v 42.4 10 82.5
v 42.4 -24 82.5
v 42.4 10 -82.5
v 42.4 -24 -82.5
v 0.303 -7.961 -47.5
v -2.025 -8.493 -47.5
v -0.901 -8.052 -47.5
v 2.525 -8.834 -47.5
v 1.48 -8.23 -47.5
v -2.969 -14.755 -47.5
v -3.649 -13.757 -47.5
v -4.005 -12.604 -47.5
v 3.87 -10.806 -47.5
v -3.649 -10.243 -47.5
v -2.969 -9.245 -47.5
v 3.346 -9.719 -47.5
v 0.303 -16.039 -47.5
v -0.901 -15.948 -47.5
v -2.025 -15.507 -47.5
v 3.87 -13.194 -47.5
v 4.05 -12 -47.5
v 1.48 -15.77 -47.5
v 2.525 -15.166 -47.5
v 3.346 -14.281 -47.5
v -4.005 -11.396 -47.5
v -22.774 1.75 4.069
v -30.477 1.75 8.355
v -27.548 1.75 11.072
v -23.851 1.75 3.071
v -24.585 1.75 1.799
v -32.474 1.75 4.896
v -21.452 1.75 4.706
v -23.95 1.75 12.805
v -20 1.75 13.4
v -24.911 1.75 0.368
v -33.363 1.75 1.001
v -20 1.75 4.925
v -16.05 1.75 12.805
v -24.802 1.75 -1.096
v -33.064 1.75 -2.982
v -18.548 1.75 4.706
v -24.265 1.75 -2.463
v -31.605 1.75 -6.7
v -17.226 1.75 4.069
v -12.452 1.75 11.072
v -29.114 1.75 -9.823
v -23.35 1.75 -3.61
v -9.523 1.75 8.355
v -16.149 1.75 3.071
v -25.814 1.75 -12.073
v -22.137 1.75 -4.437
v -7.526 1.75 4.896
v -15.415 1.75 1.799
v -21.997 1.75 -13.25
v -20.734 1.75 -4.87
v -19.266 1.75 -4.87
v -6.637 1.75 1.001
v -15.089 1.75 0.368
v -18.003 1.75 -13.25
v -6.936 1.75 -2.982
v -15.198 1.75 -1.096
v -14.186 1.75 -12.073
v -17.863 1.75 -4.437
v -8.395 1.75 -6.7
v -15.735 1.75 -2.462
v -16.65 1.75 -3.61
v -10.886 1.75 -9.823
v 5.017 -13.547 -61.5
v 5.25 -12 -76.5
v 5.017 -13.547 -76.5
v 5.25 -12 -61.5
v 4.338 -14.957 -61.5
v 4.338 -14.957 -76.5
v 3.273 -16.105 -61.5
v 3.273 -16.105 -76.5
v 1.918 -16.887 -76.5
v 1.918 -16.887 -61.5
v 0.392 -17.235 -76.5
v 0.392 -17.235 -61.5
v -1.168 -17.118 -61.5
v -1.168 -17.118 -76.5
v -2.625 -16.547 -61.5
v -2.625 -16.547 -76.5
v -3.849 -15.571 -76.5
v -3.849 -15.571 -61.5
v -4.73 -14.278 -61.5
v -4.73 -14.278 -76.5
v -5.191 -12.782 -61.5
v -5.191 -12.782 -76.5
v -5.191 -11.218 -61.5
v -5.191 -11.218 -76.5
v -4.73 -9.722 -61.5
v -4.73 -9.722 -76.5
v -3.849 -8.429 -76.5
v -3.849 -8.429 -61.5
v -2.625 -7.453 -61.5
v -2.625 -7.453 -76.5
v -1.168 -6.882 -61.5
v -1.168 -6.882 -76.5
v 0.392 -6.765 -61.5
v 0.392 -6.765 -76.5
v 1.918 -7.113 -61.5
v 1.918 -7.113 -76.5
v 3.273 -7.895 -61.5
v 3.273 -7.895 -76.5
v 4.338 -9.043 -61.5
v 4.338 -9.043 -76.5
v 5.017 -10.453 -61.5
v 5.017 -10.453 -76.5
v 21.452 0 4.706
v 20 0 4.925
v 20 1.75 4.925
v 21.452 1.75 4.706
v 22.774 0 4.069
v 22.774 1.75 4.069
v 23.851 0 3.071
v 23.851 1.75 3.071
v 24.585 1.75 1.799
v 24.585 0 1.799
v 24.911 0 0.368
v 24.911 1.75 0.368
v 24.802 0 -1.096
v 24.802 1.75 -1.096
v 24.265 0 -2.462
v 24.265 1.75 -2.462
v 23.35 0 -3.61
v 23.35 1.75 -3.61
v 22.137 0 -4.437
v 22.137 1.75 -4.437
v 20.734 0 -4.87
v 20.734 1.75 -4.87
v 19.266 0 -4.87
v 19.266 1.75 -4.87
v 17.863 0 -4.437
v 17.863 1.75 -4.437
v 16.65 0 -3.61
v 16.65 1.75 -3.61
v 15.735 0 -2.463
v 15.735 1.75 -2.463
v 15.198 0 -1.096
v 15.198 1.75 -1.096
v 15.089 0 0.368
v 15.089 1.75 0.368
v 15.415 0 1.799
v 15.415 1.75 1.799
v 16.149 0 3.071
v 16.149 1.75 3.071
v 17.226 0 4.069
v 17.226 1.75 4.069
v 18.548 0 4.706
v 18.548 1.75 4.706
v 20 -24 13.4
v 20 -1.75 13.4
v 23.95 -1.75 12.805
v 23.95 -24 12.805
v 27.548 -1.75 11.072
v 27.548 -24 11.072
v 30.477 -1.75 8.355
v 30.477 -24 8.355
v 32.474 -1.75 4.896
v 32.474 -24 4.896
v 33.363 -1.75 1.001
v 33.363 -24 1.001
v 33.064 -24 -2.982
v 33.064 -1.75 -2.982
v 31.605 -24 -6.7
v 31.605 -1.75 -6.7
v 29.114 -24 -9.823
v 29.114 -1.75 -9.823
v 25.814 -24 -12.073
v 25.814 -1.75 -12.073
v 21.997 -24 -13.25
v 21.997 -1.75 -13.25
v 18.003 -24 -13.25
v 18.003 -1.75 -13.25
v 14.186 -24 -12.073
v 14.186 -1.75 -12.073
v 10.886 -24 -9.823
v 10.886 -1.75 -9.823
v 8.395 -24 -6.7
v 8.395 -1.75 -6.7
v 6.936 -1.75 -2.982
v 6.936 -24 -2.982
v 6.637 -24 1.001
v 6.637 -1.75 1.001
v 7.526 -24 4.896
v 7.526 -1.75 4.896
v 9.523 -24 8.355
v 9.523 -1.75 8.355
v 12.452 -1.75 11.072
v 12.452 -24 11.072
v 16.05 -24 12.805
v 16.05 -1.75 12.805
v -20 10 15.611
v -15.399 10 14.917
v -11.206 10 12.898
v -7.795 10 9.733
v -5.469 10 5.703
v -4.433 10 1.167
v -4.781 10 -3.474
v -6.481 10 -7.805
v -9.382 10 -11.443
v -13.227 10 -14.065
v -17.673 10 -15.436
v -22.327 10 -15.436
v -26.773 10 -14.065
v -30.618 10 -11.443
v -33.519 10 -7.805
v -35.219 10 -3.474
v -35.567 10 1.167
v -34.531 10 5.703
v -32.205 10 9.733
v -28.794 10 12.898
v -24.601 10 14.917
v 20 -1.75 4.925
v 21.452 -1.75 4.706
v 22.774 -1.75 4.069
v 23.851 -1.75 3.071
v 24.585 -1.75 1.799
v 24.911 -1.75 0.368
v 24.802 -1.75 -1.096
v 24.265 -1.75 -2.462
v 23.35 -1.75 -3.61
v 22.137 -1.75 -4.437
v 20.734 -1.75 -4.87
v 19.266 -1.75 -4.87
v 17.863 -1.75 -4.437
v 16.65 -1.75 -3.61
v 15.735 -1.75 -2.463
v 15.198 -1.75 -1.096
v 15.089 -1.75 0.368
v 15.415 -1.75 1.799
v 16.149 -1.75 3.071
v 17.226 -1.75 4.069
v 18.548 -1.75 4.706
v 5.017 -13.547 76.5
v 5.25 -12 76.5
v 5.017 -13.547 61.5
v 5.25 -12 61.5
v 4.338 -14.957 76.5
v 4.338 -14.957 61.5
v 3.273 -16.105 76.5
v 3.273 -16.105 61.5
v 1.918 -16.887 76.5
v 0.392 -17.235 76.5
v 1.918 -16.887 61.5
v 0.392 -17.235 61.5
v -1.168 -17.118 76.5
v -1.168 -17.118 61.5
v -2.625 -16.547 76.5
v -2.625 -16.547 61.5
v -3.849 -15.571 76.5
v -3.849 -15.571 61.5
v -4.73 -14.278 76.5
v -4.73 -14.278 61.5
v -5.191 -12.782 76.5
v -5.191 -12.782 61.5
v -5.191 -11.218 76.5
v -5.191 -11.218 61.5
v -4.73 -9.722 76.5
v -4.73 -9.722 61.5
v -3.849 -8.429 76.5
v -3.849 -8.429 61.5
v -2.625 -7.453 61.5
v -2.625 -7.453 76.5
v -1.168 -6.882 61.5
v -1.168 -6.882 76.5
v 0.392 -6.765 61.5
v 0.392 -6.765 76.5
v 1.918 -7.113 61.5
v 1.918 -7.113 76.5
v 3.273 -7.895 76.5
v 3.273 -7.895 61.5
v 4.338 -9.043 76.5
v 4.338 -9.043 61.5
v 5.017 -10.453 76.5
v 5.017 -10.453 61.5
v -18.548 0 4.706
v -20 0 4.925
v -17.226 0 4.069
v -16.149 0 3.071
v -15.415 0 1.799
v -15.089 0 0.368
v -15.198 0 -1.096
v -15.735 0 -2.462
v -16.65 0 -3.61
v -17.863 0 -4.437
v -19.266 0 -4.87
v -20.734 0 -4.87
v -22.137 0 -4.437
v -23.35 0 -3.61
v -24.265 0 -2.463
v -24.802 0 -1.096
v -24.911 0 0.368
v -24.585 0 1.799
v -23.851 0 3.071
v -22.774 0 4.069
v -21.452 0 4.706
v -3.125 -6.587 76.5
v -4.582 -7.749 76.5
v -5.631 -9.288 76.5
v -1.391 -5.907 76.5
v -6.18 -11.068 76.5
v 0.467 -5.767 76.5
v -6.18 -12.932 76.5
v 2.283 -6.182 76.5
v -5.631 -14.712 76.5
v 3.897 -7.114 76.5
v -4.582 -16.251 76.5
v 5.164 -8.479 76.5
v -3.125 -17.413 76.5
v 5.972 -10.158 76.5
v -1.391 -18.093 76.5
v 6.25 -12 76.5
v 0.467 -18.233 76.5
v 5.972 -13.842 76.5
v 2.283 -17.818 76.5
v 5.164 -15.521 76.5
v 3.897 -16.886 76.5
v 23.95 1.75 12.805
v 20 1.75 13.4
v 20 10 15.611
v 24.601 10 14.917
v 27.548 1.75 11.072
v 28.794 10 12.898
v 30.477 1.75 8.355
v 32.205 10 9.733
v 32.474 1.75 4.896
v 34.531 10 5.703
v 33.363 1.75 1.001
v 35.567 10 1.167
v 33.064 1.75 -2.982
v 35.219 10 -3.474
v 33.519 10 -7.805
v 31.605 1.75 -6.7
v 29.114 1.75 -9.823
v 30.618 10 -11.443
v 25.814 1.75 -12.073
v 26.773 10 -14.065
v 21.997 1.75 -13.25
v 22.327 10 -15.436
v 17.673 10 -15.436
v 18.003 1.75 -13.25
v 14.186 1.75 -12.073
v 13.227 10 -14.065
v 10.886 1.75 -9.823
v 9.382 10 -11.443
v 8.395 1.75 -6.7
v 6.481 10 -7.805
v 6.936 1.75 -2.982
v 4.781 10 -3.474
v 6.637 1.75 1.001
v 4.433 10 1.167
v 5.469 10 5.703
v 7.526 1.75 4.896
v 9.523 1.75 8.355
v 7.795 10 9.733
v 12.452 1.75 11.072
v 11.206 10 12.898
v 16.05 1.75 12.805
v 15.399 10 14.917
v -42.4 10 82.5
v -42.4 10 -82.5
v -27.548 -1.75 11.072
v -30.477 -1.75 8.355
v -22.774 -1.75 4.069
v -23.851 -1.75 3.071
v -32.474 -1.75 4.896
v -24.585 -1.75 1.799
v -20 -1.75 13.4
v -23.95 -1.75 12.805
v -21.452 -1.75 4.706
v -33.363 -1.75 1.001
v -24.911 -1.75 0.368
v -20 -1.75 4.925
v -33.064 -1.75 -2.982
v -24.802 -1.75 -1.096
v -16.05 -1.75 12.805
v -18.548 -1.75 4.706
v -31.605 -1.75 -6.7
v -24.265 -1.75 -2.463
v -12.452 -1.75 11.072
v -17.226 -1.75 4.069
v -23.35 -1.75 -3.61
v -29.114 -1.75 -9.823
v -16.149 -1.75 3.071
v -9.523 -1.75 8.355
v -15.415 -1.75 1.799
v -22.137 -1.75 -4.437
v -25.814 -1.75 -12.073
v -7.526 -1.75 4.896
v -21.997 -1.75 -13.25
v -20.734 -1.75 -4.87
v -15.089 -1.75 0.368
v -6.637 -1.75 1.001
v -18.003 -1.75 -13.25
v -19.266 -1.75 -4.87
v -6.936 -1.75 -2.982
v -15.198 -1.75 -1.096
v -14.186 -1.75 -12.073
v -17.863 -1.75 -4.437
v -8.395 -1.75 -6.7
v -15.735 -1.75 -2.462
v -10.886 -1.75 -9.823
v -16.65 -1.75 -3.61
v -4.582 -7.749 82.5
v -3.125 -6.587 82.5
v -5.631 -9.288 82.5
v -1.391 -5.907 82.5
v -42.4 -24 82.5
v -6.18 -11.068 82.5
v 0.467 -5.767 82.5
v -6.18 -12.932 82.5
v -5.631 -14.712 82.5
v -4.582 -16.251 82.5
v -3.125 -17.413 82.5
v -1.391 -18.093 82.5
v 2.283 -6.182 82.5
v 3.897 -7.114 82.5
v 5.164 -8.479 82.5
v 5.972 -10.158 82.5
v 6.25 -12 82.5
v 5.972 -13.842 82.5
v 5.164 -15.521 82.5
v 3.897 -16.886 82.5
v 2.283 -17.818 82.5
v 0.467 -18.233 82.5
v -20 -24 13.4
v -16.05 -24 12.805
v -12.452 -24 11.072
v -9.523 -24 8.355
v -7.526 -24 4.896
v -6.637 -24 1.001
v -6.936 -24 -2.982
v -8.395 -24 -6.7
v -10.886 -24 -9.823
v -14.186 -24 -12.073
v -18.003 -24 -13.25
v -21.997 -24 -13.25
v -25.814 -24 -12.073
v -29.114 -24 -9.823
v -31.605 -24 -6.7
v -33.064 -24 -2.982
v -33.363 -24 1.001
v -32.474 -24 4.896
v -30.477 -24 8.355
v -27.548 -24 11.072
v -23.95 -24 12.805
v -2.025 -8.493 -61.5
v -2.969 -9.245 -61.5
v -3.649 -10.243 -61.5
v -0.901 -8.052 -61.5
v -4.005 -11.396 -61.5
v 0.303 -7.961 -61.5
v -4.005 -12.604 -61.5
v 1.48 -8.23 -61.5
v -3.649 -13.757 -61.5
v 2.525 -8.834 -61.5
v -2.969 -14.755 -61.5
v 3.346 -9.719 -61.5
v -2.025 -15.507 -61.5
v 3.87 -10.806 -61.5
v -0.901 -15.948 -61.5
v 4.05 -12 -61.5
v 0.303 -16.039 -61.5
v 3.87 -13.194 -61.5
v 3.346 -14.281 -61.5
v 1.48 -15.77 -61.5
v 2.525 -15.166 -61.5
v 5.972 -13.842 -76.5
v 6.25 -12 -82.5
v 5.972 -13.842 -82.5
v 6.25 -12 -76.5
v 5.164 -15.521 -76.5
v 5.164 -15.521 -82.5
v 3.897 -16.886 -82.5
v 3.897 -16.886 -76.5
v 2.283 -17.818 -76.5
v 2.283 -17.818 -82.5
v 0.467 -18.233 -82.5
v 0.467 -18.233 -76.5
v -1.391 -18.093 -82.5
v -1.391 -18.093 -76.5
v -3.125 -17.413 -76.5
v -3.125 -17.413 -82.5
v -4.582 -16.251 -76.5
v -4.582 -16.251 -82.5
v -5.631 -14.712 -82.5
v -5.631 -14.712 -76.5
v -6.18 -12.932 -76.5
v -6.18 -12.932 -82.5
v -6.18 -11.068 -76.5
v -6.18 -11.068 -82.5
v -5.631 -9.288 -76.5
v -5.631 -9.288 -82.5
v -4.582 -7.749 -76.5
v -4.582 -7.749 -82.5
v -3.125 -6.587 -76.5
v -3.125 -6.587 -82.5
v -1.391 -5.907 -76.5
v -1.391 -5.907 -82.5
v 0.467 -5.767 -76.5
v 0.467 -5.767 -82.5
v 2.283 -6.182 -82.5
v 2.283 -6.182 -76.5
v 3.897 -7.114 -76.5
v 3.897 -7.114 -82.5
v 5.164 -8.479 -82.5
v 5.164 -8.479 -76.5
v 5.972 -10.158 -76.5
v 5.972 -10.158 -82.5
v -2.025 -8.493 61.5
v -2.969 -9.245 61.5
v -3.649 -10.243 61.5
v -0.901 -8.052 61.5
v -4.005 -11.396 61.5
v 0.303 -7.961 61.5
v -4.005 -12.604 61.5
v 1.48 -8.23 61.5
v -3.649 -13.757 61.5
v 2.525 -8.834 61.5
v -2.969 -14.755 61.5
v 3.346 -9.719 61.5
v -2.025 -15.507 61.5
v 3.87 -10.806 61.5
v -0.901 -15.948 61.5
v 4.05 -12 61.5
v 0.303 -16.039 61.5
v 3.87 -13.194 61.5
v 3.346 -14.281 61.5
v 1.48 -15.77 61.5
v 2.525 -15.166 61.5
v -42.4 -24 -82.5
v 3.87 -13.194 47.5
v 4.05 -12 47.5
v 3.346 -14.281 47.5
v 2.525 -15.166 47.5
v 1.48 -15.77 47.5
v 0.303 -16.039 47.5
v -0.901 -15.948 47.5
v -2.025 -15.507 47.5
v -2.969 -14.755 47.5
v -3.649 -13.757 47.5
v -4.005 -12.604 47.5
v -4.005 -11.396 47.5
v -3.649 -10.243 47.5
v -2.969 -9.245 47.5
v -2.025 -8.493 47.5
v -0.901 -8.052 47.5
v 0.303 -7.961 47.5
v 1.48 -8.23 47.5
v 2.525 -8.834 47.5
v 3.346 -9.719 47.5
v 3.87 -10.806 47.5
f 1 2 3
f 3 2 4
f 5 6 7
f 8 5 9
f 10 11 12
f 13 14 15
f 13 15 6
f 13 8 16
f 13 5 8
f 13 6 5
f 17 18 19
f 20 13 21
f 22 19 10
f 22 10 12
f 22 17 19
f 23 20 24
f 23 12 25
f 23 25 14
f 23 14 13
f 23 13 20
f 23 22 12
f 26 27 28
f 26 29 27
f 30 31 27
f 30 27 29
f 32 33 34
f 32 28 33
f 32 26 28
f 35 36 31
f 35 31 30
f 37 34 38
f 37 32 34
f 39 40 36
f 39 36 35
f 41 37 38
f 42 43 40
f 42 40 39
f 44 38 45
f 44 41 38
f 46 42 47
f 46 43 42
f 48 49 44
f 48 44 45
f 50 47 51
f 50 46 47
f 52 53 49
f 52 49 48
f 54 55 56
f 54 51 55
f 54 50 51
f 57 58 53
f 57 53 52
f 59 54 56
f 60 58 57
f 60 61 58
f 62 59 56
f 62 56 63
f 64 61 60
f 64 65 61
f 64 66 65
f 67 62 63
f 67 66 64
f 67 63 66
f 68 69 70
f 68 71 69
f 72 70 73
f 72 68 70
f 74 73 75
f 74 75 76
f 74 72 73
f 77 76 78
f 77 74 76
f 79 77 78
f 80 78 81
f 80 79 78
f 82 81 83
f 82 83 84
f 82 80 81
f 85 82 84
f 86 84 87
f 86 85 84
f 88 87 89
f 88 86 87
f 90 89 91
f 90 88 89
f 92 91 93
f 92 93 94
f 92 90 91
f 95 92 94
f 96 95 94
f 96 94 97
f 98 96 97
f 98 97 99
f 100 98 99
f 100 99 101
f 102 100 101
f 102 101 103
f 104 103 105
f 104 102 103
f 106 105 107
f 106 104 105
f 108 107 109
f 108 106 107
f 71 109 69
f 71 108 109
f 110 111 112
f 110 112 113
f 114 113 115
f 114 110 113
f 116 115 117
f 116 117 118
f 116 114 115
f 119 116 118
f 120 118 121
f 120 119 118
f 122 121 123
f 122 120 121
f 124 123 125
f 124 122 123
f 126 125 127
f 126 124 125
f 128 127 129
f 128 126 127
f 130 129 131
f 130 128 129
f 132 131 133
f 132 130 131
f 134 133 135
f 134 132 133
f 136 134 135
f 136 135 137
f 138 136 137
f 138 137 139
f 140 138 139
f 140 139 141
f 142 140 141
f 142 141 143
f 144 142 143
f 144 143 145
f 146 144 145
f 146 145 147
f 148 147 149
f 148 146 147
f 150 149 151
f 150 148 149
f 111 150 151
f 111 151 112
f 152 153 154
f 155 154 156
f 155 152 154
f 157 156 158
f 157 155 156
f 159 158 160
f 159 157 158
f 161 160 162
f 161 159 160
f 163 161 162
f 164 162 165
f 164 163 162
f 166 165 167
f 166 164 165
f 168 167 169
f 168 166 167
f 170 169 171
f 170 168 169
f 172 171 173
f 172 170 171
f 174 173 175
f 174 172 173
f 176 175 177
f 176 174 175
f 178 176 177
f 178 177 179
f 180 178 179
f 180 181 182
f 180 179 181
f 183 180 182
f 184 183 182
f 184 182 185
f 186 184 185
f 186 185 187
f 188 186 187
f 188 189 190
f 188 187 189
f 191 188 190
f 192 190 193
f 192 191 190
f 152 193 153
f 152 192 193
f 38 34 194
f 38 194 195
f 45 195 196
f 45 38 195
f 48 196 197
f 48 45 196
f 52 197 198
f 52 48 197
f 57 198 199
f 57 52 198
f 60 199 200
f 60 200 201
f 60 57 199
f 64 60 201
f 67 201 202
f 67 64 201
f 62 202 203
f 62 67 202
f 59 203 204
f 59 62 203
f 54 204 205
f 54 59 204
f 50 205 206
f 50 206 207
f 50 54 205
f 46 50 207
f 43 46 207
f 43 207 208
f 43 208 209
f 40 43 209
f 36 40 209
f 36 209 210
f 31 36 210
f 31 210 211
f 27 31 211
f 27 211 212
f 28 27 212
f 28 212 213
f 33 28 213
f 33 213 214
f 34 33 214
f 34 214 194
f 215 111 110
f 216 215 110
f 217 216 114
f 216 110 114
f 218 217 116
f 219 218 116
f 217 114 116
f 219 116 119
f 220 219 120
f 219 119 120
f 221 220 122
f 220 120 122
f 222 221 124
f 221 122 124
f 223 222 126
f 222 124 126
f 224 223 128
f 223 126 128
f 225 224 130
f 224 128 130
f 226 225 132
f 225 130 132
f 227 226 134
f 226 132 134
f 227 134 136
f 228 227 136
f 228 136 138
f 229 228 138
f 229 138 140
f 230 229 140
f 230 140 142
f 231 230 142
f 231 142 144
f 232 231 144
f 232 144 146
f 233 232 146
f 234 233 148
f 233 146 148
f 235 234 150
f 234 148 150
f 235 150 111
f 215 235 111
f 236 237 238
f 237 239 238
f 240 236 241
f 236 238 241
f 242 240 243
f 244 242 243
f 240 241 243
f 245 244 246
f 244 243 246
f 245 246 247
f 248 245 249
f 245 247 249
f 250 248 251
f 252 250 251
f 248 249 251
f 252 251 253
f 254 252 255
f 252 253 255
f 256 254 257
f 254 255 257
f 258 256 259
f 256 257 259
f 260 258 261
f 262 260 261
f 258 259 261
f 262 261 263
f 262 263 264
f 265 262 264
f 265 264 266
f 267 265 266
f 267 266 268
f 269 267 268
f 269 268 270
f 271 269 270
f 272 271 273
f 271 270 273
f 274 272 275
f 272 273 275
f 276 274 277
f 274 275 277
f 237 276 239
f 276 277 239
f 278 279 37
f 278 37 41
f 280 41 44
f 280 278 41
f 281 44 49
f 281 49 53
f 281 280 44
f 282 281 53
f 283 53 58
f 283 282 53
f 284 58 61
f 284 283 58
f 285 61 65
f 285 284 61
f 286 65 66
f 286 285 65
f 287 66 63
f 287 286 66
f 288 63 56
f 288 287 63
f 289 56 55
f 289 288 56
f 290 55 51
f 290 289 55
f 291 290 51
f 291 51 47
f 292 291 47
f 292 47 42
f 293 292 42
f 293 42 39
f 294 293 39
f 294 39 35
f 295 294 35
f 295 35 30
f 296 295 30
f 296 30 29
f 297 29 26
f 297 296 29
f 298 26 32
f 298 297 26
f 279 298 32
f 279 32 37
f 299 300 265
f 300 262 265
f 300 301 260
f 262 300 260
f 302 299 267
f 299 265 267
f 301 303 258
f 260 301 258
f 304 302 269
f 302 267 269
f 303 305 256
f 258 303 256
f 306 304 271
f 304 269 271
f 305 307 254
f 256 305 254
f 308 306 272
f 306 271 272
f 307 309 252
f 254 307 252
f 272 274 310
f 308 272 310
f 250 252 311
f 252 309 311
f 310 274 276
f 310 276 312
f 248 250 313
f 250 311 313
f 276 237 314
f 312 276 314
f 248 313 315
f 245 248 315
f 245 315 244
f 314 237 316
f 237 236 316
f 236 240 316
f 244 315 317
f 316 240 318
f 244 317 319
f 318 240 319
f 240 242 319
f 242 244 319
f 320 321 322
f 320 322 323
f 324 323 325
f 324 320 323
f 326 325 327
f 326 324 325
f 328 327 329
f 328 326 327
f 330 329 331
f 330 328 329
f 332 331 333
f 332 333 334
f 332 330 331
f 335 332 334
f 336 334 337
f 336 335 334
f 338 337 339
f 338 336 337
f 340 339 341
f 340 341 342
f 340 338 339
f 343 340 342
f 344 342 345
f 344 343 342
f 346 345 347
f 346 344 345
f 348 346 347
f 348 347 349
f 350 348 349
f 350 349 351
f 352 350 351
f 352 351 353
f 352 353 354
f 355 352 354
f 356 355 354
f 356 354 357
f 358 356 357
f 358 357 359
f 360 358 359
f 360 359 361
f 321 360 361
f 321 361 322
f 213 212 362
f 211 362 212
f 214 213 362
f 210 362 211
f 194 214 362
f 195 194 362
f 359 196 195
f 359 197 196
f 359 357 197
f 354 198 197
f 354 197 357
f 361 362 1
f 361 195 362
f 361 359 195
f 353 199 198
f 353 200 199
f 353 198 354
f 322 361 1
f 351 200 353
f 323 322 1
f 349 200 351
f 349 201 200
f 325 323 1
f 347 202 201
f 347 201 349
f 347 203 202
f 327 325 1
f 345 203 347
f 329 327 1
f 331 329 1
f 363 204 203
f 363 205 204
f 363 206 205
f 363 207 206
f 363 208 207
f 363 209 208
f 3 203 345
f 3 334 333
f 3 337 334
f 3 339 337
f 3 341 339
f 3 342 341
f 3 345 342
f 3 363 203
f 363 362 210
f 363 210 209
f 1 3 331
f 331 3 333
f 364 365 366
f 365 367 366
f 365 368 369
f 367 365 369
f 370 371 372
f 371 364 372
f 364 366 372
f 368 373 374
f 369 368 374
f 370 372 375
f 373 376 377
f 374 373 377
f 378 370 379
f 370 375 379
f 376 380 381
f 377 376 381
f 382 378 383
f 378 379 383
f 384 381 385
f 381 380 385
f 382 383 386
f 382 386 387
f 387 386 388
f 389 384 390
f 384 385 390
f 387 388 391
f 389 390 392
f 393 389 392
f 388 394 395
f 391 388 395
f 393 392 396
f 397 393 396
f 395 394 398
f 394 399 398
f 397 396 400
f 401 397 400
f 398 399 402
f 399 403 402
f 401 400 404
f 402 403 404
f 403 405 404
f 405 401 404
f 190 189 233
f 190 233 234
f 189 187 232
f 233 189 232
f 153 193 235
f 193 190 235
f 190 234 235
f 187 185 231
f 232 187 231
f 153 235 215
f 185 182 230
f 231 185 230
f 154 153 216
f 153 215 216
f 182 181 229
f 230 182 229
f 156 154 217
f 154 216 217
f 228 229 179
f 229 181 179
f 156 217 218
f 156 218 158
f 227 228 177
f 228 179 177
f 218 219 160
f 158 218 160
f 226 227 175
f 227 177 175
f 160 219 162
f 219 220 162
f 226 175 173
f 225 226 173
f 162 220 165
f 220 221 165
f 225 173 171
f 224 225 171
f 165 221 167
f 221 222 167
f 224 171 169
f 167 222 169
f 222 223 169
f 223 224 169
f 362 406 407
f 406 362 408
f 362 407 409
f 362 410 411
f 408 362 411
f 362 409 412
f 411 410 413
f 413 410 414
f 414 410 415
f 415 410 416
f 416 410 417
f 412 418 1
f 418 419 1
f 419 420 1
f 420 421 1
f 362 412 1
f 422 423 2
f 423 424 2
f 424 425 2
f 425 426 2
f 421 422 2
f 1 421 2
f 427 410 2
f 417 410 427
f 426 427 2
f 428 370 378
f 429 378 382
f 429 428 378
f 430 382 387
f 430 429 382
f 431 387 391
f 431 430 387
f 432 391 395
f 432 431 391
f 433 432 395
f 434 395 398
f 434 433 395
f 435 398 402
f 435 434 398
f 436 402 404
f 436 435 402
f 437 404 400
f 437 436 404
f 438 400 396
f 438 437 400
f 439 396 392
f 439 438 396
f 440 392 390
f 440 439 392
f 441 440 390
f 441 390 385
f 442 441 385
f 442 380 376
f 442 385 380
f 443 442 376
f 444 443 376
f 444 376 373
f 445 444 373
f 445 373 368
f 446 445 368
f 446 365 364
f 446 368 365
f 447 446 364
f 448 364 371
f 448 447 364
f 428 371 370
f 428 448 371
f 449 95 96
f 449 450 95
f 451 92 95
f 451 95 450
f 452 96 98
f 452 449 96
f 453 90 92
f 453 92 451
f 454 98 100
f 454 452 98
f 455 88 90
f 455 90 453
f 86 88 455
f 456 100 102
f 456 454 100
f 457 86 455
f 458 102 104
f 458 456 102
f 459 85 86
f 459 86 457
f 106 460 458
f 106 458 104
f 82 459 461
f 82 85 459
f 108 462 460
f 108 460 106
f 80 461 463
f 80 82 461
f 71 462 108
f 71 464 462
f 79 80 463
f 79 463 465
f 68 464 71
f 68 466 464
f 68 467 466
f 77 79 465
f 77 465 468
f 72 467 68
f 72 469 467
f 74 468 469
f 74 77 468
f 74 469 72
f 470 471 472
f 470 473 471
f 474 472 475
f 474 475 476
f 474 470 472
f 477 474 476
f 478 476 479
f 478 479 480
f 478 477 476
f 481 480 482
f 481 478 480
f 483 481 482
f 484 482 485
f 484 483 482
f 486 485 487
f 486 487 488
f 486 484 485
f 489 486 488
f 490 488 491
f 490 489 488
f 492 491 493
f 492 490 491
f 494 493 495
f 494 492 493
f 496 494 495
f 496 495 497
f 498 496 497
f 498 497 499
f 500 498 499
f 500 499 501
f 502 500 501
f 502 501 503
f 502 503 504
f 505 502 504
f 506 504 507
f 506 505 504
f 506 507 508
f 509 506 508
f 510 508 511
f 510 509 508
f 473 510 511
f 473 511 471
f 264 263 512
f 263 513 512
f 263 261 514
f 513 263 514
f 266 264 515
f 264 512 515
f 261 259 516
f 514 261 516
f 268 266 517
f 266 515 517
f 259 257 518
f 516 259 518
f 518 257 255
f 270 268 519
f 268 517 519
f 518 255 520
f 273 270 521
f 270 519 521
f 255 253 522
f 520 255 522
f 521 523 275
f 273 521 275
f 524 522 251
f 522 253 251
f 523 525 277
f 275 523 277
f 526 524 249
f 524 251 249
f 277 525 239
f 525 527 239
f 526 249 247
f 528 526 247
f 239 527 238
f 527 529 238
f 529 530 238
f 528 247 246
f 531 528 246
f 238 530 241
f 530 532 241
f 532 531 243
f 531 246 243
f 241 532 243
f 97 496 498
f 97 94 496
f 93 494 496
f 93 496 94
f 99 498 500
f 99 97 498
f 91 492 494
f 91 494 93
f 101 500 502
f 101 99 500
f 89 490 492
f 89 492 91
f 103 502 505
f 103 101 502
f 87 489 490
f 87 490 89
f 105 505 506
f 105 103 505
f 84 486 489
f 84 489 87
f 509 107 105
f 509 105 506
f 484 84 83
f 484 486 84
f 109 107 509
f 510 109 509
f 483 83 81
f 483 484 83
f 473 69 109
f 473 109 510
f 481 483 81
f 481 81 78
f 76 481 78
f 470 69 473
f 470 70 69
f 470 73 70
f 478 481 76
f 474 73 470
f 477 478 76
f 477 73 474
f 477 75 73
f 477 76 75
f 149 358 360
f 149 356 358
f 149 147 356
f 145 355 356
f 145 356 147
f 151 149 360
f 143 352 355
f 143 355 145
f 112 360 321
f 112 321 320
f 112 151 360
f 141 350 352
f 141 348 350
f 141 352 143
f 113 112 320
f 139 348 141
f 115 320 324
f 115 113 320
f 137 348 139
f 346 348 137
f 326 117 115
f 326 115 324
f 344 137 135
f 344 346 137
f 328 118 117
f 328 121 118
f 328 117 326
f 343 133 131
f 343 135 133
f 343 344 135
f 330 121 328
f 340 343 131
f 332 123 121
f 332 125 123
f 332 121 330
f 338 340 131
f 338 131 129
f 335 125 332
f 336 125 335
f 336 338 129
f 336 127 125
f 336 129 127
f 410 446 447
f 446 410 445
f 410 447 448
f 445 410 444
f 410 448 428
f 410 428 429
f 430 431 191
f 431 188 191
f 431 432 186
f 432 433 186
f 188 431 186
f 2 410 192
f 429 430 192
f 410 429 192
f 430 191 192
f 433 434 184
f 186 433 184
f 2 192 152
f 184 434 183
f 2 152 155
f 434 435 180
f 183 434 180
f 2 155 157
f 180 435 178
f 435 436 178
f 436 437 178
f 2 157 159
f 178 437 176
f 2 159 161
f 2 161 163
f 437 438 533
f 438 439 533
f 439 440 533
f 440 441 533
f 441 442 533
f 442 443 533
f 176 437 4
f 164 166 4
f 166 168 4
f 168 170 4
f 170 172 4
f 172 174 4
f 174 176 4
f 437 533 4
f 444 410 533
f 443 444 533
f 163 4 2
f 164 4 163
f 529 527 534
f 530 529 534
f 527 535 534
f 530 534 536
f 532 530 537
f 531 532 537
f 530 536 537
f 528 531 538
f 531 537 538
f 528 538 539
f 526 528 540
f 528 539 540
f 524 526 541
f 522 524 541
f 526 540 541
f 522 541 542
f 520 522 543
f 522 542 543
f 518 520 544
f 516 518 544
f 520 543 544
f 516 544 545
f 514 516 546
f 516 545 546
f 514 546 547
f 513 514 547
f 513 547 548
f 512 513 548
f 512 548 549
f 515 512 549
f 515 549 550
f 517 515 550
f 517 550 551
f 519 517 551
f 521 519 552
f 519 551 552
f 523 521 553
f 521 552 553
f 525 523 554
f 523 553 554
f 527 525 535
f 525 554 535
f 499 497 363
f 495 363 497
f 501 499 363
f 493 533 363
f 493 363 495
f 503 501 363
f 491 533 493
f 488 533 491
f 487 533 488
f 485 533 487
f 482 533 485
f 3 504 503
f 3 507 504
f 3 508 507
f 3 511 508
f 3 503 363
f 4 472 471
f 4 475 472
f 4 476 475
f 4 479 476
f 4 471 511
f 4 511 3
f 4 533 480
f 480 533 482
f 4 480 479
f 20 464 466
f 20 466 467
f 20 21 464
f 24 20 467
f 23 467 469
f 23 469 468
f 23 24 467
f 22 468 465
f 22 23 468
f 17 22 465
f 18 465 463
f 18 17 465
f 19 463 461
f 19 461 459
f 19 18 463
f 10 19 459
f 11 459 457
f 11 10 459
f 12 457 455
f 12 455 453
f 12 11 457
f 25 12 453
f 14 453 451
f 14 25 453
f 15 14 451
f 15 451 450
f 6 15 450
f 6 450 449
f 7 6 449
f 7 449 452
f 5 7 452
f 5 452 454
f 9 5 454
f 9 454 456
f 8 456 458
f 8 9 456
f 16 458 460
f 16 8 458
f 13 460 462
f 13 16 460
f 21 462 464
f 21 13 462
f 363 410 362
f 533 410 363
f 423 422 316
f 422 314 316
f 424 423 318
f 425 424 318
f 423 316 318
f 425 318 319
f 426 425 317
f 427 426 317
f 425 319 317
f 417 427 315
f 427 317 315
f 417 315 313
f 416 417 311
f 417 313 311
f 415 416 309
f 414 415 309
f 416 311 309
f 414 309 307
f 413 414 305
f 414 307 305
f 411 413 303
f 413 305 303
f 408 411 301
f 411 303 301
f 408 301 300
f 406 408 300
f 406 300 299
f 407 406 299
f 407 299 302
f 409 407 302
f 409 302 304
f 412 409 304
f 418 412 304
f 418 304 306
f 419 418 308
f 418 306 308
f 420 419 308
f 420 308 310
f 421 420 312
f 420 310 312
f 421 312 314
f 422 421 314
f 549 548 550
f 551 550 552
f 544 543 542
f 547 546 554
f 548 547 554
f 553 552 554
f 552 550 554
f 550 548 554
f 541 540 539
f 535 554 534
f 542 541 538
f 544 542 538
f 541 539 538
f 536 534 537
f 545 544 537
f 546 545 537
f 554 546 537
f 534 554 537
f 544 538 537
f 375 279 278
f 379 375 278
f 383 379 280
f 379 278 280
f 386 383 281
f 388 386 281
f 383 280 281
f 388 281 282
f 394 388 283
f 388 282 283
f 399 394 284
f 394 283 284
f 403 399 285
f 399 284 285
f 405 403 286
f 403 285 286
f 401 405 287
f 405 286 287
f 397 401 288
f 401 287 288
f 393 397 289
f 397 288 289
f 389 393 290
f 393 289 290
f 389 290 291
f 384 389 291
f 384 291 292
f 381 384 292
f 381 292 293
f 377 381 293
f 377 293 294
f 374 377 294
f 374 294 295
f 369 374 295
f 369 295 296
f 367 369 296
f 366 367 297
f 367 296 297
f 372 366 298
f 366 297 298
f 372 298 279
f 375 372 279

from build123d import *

# Parameters (mm, degrees)
SKETCH1_W           = 84.8
SKETCH1_H           = 165
SKETCH1_R           = 4.925
BOSS_EXTRUDE1_DEPTH = 1.75
SKETCH1_3_W         = 84.8
SKETCH1_3_H         = 165
SKETCH1_3_R         = 13.4
BOSS_EXTRUDE2_DEPTH = 10
BOSS_EXTRUDE3_START = -24
SKETCH1_4_W         = 84.8
SKETCH1_4_H         = 165
SKETCH1_4_R         = 13.4
BOSS_EXTRUDE3_DEPTH = 24
DRAFT1_ANGLE        = 15


with BuildPart() as part:
    # Sketch1 → Boss-Extrude1 (new, symmetric)
    with BuildSketch(Plane(origin=(0, 0, 0), x_dir=(1, 0, 0), z_dir=(0, 1, 0))):
        Rectangle(SKETCH1_W, SKETCH1_H)
        with Locations((-20, 0)):
            Circle(SKETCH1_R, mode=Mode.SUBTRACT)
        with Locations((20, 0)):
            Circle(SKETCH1_R, mode=Mode.SUBTRACT)
    extrude(amount=BOSS_EXTRUDE1_DEPTH, both=True)

    # Sketch1<3> → Boss-Extrude2 (add)
    with BuildSketch(Plane(origin=(0, 0, 0), x_dir=(1, 0, 0), z_dir=(0, 1, 0))):
        Rectangle(SKETCH1_3_W, SKETCH1_3_H)
        with Locations((-20, 0)):
            Circle(SKETCH1_3_R, mode=Mode.SUBTRACT)
        with Locations((20, 0)):
            Circle(SKETCH1_3_R, mode=Mode.SUBTRACT)
    extrude(amount=BOSS_EXTRUDE2_DEPTH)

    # Sketch1<4> → Boss-Extrude3 (add)
    with BuildSketch(Plane(origin=(0, 0, 0), x_dir=(1, 0, 0), z_dir=(0, 1, 0)).offset(BOSS_EXTRUDE3_START)):
        Rectangle(SKETCH1_4_W, SKETCH1_4_H)
        with Locations((-20, 0)):
            Circle(SKETCH1_4_R, mode=Mode.SUBTRACT)
        with Locations((20, 0)):
            Circle(SKETCH1_4_R, mode=Mode.SUBTRACT)
    extrude(amount=BOSS_EXTRUDE3_DEPTH)

    # Sketch3 → Cut-Revolve1 (revolve, cut)
    with BuildSketch(Plane(origin=(0, -12, 0), x_dir=(1, 0, 0), z_dir=(0, 1, 0))):
        Polygon((-6.25, -82.5), (-6.25, -76.5), (-5.25, -76.5), (-5.25, -61.5), (-4.05, -61.5), (-4.05, -47.5), (0, -47.5), (0, -82.5), align=None)
    cut_revolve1 = revolve(axis=Axis((0, -12, 82.5), (0, 0, -1)), mode=Mode.SUBTRACT)

    # Mirror1: Cut-Revolve1 across plane
    add(cut_revolve1.mirror(Plane.XY), mode=Mode.SUBTRACT)

    # Draft1
    draft1_faces = [part.faces().sort_by_distance(p)[0] for p in [
        (-33.4, 5.875, 0),
        (6.6, 5.875, 0),
    ]]
    draft(draft1_faces, Plane.ZX.offset(1.75), DRAFT1_ANGLE)


solid = part.part
